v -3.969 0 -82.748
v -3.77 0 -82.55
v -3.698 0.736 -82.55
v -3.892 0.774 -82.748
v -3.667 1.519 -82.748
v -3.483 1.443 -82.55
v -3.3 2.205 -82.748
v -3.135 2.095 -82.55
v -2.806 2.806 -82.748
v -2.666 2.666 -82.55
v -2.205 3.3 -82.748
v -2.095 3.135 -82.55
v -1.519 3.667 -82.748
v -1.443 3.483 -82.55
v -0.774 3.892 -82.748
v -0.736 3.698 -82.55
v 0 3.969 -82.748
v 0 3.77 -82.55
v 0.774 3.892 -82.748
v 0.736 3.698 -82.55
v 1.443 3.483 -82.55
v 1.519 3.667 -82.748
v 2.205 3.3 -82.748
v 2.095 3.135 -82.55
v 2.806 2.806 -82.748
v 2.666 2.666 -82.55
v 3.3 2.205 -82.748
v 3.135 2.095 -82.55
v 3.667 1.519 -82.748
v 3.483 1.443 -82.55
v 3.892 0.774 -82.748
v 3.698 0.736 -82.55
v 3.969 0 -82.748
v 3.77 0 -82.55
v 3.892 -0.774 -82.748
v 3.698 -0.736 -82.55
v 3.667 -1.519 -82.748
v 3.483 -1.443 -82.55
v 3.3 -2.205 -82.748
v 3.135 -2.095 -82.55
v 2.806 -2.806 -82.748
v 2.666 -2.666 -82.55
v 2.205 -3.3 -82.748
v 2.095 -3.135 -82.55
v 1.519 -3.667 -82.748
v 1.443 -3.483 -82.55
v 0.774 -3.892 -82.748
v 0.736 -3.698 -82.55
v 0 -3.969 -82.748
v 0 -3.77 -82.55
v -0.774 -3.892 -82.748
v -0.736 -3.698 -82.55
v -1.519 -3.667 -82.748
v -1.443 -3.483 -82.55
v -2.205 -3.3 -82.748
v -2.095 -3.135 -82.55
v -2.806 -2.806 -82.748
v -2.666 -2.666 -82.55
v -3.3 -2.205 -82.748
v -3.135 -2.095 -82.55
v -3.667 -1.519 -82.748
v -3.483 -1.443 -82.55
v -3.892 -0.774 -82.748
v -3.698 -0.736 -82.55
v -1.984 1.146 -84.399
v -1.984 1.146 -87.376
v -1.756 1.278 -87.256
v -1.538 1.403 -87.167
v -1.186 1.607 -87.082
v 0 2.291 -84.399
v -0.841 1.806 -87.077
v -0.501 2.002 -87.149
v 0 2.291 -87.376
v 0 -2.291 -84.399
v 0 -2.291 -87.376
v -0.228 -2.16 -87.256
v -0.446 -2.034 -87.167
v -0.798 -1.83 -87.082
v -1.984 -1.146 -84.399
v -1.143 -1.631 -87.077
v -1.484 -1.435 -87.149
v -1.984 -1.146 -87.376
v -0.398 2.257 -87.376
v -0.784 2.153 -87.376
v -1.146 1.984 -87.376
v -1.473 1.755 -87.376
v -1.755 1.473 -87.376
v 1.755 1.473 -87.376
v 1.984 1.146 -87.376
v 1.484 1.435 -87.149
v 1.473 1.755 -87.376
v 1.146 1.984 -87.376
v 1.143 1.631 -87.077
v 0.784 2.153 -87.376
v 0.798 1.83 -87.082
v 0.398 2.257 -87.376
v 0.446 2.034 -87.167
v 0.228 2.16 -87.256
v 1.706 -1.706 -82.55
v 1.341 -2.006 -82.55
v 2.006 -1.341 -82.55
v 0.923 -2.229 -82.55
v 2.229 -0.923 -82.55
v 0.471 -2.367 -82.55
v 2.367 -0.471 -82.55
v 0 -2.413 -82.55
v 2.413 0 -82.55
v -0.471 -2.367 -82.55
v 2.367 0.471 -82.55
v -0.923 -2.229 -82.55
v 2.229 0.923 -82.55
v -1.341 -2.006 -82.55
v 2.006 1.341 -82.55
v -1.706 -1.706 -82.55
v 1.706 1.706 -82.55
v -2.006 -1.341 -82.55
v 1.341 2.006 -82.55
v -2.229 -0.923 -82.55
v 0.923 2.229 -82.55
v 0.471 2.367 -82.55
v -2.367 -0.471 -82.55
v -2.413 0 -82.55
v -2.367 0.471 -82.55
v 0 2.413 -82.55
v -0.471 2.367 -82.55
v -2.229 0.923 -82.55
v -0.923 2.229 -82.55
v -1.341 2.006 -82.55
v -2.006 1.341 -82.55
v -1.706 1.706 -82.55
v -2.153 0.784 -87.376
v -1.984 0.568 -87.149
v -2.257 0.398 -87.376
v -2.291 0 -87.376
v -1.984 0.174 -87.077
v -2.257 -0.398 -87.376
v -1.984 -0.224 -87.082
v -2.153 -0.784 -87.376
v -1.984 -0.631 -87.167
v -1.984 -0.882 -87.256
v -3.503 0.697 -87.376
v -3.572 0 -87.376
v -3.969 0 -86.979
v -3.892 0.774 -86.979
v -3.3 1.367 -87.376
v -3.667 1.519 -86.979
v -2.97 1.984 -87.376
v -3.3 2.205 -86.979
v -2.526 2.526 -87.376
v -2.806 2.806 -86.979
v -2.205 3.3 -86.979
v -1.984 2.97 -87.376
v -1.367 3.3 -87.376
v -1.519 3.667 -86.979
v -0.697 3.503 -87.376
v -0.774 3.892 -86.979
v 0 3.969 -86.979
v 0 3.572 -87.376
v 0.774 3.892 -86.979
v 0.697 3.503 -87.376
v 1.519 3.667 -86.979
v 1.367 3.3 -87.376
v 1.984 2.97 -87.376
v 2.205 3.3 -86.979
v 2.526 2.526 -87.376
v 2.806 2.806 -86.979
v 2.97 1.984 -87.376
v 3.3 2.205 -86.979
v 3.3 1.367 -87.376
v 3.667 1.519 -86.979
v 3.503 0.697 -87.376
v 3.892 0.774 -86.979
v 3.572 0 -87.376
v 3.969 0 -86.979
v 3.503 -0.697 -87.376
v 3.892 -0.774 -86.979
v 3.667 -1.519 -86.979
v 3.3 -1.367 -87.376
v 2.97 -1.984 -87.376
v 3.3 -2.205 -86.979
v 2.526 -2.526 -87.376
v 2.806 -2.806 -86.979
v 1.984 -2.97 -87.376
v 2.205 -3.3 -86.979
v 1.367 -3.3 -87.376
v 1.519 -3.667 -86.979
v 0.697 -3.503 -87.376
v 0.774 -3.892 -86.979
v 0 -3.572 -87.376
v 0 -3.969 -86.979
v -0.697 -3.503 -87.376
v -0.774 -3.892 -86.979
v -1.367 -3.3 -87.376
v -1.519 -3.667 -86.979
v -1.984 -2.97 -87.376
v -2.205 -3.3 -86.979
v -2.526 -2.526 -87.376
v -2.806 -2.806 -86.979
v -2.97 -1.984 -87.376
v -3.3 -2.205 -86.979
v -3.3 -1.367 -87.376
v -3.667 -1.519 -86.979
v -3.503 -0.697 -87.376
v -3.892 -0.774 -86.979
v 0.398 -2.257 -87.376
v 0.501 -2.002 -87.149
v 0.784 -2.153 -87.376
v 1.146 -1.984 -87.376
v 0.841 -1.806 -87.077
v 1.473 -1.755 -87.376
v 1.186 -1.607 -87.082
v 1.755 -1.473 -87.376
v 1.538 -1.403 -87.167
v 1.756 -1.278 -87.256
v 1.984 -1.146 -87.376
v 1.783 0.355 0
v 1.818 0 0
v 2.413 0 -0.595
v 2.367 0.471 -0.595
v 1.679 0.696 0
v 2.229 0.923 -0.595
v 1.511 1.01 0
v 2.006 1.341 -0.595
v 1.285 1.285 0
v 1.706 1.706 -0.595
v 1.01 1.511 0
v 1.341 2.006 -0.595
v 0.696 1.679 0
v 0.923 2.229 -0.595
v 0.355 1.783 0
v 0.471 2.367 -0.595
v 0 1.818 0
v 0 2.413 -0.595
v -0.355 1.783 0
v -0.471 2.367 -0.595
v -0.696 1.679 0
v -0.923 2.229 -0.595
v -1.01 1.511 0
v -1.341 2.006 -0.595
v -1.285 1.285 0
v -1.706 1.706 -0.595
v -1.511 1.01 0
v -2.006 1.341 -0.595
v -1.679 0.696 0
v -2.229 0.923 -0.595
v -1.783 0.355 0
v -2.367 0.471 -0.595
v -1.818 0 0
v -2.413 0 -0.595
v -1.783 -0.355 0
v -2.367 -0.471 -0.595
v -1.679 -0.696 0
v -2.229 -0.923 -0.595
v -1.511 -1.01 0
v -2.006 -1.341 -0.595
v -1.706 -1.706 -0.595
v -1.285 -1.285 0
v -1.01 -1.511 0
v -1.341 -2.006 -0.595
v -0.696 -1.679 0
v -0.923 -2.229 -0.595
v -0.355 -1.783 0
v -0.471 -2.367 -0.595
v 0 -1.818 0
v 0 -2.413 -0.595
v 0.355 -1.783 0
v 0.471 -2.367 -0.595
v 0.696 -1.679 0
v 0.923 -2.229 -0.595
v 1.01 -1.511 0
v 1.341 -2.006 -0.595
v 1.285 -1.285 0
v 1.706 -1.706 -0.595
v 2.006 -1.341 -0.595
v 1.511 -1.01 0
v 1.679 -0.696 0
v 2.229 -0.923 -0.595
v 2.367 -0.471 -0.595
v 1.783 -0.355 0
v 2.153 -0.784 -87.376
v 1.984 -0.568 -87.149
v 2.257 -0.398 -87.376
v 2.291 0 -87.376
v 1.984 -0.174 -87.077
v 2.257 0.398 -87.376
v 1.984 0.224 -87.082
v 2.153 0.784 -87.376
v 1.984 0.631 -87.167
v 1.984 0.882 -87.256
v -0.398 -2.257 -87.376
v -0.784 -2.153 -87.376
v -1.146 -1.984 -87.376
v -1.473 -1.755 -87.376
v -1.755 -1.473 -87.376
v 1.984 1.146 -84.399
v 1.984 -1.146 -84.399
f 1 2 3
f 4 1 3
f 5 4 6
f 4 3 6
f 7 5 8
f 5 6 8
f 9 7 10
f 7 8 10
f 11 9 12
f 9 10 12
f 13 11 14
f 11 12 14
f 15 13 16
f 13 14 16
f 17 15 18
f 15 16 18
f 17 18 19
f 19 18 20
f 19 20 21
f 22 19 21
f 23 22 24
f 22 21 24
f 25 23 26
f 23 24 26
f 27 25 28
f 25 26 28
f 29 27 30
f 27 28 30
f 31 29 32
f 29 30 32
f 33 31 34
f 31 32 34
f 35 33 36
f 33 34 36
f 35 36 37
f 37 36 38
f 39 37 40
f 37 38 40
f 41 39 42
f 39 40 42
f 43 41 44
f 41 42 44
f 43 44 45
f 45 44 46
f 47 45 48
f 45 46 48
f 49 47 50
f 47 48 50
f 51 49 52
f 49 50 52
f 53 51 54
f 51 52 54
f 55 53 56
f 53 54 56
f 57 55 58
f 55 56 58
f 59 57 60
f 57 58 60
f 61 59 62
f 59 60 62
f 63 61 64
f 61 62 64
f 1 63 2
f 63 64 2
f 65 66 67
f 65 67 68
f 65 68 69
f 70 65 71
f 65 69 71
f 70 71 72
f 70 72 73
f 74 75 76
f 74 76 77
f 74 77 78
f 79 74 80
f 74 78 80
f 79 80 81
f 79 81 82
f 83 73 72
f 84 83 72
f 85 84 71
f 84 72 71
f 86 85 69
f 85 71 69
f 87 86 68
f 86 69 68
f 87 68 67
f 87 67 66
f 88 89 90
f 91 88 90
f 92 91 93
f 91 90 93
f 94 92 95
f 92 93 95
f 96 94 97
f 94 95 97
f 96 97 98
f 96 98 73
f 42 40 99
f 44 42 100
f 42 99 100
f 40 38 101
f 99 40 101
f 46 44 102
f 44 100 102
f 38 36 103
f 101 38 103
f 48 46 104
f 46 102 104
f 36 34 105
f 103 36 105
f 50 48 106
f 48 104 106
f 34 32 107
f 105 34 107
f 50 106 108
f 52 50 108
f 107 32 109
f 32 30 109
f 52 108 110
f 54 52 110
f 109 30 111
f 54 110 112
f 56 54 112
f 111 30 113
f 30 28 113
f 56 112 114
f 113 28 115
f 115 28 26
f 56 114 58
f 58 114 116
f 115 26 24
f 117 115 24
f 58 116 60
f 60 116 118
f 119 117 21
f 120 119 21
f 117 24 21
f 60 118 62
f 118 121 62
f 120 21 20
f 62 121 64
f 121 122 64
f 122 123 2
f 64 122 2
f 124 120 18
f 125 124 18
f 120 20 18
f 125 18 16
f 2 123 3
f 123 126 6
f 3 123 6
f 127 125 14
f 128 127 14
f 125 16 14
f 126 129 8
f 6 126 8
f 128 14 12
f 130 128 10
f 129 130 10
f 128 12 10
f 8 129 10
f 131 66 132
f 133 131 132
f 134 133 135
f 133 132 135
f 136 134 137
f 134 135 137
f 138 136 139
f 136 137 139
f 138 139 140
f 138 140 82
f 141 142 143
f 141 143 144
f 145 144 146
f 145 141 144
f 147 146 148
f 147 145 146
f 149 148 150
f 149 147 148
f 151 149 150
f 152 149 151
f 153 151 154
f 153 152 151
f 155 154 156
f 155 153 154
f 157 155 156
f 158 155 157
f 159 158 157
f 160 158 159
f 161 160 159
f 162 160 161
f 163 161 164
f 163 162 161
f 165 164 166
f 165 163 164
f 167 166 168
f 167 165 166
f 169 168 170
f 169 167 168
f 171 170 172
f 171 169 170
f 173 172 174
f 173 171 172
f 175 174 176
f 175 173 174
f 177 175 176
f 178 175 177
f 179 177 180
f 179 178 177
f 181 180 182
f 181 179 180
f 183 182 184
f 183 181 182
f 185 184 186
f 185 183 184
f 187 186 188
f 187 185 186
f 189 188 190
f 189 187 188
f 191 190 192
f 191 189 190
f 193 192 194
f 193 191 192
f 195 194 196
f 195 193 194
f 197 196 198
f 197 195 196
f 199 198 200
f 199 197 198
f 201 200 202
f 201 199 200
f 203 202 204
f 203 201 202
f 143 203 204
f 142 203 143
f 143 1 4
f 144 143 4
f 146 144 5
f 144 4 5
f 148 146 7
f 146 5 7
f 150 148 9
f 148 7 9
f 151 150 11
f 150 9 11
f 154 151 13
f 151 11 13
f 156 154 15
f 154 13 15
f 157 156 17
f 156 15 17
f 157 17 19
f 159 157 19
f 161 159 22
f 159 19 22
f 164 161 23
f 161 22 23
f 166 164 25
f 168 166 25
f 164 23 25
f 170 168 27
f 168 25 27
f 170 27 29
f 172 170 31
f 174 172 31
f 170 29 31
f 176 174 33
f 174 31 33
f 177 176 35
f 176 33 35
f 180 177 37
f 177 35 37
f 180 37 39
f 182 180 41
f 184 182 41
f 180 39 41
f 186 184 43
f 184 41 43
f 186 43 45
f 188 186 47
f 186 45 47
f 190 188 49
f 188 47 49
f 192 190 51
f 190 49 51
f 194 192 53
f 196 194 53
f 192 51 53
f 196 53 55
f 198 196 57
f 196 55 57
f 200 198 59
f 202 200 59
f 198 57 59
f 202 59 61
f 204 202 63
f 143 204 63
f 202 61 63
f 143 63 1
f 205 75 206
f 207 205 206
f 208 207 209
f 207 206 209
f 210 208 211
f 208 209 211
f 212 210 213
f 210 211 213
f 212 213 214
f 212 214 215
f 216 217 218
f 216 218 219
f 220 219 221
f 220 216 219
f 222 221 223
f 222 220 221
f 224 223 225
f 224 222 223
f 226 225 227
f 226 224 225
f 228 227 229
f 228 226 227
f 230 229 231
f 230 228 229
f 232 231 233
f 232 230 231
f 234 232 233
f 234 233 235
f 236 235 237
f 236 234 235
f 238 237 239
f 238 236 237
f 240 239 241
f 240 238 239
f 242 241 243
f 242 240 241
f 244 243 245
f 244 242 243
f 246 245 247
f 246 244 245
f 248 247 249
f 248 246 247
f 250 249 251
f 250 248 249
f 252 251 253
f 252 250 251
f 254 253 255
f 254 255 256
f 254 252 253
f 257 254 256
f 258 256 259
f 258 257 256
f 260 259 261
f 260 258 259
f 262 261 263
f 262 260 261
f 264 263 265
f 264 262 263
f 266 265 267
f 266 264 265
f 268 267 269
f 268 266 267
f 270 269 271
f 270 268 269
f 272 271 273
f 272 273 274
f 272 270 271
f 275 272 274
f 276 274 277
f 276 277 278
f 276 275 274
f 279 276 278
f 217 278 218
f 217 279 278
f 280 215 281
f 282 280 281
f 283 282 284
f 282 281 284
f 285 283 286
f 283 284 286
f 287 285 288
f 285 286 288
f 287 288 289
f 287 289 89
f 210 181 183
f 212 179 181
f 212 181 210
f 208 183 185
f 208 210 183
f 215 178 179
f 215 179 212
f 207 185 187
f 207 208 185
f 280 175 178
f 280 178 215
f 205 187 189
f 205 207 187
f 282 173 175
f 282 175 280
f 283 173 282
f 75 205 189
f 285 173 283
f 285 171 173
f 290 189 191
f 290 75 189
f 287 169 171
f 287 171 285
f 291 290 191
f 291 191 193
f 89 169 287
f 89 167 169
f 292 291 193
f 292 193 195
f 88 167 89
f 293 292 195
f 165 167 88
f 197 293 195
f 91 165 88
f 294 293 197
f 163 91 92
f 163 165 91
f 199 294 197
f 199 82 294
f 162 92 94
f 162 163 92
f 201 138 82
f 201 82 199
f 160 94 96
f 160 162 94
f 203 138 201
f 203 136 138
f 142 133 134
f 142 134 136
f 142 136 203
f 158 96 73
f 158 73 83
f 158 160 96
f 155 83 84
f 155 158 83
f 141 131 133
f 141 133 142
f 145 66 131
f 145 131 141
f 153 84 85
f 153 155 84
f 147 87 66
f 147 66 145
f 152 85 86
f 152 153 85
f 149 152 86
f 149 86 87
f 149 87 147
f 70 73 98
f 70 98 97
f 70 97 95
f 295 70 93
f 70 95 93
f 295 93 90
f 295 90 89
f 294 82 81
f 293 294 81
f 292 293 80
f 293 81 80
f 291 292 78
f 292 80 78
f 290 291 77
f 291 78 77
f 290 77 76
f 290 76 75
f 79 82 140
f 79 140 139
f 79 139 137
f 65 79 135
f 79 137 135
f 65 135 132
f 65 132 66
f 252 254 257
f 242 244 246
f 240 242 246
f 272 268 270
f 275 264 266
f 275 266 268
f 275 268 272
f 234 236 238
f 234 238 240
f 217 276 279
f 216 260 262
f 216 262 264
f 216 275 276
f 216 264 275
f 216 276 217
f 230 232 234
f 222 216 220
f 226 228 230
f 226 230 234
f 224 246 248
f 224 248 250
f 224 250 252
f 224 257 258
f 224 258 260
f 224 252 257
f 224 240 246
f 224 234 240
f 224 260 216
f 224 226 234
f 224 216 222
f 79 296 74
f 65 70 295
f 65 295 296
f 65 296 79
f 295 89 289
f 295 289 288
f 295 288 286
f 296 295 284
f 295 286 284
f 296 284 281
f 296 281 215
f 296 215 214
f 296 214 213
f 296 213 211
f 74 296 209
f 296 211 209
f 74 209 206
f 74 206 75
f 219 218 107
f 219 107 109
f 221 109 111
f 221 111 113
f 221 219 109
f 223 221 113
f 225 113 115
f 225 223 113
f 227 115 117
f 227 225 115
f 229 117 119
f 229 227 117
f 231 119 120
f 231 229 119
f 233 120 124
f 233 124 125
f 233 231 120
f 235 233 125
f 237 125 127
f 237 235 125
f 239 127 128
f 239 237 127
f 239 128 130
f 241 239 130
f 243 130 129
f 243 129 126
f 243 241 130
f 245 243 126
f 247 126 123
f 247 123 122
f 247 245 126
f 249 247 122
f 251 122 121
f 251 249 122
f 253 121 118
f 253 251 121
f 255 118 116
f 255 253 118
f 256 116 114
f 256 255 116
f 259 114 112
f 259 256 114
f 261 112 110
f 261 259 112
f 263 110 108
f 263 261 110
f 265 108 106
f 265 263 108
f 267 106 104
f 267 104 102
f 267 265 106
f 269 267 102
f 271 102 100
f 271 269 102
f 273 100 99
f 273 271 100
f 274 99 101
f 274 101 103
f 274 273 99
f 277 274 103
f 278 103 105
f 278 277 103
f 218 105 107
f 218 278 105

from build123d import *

# Parameters (mm, degrees)
SKETCH1_R          = 2.413
EXTRUDE1_DEPTH     = 82.55
CHAMFER3_SIZE      = 0.5953125
SKETCH6_R          = 3.96875
EXTRUDE2_DEPTH     = 4.826
CUT_EXTRUDE1_DEPTH = 2.9765625
CHAMFER1_SIZE      = 0.396875
CHAMFER2_SIZE      = 0.1984375


with BuildPart() as part:
    # Sketch1 → Extrude1 (new body)
    with BuildSketch(Plane.XY):
        Circle(SKETCH1_R)
    extrude(amount=-EXTRUDE1_DEPTH)

    # Chamfer3
    chamfer3_edges = [part.edges().sort_by_distance(p)[0] for p in [
        (-2.413, 0, 0),
    ]]
    chamfer(chamfer3_edges, length=CHAMFER3_SIZE)

    # Sketch6 → Extrude2 (add)
    with BuildSketch(Plane(origin=(0, 0, -82.55), x_dir=(-1, 0, 0), z_dir=(0, 0, -1))):
        Circle(SKETCH6_R)
    extrude(amount=EXTRUDE2_DEPTH)

    # Sketch7 → Cut-Extrude1 (cut)
    with BuildSketch(Plane(origin=(0, 0, -87.376), x_dir=(-1, 0, 0), z_dir=(0, 0, -1))):
        Polygon((0, 2.291358881), (-1.984375, 1.14567944), (-1.984375, -1.14567944), (0, -2.291358881), (1.984375, -1.14567944), (1.984375, 1.14567944), align=None)
    extrude(amount=-CUT_EXTRUDE1_DEPTH, mode=Mode.SUBTRACT)

    # Cut-Extrude2 cone 1 section (through the dimple's axis) → Cut-Extrude2 (revolve, cut)
    with BuildSketch(Plane(origin=(0, 0, -87.376), x_dir=(0, 1, 0), z_dir=(1, 0, 0))):
        Polygon((0, 0), (2.291358881, 0), (0, 2.291358881), align=None)
    revolve(axis=Axis((0, 0, -87.376), (0, 0, 1)), mode=Mode.SUBTRACT)

    # Chamfer1
    chamfer1_edges = [part.edges().sort_by_distance(p)[0] for p in [
        (3.96875, 0, -87.376),
    ]]
    chamfer(chamfer1_edges, length=CHAMFER1_SIZE)

    # Chamfer2
    chamfer2_edges = [part.edges().sort_by_distance(p)[0] for p in [
        (3.96875, 0, -82.55),
    ]]
    chamfer(chamfer2_edges, length=CHAMFER2_SIZE)


solid = part.part
